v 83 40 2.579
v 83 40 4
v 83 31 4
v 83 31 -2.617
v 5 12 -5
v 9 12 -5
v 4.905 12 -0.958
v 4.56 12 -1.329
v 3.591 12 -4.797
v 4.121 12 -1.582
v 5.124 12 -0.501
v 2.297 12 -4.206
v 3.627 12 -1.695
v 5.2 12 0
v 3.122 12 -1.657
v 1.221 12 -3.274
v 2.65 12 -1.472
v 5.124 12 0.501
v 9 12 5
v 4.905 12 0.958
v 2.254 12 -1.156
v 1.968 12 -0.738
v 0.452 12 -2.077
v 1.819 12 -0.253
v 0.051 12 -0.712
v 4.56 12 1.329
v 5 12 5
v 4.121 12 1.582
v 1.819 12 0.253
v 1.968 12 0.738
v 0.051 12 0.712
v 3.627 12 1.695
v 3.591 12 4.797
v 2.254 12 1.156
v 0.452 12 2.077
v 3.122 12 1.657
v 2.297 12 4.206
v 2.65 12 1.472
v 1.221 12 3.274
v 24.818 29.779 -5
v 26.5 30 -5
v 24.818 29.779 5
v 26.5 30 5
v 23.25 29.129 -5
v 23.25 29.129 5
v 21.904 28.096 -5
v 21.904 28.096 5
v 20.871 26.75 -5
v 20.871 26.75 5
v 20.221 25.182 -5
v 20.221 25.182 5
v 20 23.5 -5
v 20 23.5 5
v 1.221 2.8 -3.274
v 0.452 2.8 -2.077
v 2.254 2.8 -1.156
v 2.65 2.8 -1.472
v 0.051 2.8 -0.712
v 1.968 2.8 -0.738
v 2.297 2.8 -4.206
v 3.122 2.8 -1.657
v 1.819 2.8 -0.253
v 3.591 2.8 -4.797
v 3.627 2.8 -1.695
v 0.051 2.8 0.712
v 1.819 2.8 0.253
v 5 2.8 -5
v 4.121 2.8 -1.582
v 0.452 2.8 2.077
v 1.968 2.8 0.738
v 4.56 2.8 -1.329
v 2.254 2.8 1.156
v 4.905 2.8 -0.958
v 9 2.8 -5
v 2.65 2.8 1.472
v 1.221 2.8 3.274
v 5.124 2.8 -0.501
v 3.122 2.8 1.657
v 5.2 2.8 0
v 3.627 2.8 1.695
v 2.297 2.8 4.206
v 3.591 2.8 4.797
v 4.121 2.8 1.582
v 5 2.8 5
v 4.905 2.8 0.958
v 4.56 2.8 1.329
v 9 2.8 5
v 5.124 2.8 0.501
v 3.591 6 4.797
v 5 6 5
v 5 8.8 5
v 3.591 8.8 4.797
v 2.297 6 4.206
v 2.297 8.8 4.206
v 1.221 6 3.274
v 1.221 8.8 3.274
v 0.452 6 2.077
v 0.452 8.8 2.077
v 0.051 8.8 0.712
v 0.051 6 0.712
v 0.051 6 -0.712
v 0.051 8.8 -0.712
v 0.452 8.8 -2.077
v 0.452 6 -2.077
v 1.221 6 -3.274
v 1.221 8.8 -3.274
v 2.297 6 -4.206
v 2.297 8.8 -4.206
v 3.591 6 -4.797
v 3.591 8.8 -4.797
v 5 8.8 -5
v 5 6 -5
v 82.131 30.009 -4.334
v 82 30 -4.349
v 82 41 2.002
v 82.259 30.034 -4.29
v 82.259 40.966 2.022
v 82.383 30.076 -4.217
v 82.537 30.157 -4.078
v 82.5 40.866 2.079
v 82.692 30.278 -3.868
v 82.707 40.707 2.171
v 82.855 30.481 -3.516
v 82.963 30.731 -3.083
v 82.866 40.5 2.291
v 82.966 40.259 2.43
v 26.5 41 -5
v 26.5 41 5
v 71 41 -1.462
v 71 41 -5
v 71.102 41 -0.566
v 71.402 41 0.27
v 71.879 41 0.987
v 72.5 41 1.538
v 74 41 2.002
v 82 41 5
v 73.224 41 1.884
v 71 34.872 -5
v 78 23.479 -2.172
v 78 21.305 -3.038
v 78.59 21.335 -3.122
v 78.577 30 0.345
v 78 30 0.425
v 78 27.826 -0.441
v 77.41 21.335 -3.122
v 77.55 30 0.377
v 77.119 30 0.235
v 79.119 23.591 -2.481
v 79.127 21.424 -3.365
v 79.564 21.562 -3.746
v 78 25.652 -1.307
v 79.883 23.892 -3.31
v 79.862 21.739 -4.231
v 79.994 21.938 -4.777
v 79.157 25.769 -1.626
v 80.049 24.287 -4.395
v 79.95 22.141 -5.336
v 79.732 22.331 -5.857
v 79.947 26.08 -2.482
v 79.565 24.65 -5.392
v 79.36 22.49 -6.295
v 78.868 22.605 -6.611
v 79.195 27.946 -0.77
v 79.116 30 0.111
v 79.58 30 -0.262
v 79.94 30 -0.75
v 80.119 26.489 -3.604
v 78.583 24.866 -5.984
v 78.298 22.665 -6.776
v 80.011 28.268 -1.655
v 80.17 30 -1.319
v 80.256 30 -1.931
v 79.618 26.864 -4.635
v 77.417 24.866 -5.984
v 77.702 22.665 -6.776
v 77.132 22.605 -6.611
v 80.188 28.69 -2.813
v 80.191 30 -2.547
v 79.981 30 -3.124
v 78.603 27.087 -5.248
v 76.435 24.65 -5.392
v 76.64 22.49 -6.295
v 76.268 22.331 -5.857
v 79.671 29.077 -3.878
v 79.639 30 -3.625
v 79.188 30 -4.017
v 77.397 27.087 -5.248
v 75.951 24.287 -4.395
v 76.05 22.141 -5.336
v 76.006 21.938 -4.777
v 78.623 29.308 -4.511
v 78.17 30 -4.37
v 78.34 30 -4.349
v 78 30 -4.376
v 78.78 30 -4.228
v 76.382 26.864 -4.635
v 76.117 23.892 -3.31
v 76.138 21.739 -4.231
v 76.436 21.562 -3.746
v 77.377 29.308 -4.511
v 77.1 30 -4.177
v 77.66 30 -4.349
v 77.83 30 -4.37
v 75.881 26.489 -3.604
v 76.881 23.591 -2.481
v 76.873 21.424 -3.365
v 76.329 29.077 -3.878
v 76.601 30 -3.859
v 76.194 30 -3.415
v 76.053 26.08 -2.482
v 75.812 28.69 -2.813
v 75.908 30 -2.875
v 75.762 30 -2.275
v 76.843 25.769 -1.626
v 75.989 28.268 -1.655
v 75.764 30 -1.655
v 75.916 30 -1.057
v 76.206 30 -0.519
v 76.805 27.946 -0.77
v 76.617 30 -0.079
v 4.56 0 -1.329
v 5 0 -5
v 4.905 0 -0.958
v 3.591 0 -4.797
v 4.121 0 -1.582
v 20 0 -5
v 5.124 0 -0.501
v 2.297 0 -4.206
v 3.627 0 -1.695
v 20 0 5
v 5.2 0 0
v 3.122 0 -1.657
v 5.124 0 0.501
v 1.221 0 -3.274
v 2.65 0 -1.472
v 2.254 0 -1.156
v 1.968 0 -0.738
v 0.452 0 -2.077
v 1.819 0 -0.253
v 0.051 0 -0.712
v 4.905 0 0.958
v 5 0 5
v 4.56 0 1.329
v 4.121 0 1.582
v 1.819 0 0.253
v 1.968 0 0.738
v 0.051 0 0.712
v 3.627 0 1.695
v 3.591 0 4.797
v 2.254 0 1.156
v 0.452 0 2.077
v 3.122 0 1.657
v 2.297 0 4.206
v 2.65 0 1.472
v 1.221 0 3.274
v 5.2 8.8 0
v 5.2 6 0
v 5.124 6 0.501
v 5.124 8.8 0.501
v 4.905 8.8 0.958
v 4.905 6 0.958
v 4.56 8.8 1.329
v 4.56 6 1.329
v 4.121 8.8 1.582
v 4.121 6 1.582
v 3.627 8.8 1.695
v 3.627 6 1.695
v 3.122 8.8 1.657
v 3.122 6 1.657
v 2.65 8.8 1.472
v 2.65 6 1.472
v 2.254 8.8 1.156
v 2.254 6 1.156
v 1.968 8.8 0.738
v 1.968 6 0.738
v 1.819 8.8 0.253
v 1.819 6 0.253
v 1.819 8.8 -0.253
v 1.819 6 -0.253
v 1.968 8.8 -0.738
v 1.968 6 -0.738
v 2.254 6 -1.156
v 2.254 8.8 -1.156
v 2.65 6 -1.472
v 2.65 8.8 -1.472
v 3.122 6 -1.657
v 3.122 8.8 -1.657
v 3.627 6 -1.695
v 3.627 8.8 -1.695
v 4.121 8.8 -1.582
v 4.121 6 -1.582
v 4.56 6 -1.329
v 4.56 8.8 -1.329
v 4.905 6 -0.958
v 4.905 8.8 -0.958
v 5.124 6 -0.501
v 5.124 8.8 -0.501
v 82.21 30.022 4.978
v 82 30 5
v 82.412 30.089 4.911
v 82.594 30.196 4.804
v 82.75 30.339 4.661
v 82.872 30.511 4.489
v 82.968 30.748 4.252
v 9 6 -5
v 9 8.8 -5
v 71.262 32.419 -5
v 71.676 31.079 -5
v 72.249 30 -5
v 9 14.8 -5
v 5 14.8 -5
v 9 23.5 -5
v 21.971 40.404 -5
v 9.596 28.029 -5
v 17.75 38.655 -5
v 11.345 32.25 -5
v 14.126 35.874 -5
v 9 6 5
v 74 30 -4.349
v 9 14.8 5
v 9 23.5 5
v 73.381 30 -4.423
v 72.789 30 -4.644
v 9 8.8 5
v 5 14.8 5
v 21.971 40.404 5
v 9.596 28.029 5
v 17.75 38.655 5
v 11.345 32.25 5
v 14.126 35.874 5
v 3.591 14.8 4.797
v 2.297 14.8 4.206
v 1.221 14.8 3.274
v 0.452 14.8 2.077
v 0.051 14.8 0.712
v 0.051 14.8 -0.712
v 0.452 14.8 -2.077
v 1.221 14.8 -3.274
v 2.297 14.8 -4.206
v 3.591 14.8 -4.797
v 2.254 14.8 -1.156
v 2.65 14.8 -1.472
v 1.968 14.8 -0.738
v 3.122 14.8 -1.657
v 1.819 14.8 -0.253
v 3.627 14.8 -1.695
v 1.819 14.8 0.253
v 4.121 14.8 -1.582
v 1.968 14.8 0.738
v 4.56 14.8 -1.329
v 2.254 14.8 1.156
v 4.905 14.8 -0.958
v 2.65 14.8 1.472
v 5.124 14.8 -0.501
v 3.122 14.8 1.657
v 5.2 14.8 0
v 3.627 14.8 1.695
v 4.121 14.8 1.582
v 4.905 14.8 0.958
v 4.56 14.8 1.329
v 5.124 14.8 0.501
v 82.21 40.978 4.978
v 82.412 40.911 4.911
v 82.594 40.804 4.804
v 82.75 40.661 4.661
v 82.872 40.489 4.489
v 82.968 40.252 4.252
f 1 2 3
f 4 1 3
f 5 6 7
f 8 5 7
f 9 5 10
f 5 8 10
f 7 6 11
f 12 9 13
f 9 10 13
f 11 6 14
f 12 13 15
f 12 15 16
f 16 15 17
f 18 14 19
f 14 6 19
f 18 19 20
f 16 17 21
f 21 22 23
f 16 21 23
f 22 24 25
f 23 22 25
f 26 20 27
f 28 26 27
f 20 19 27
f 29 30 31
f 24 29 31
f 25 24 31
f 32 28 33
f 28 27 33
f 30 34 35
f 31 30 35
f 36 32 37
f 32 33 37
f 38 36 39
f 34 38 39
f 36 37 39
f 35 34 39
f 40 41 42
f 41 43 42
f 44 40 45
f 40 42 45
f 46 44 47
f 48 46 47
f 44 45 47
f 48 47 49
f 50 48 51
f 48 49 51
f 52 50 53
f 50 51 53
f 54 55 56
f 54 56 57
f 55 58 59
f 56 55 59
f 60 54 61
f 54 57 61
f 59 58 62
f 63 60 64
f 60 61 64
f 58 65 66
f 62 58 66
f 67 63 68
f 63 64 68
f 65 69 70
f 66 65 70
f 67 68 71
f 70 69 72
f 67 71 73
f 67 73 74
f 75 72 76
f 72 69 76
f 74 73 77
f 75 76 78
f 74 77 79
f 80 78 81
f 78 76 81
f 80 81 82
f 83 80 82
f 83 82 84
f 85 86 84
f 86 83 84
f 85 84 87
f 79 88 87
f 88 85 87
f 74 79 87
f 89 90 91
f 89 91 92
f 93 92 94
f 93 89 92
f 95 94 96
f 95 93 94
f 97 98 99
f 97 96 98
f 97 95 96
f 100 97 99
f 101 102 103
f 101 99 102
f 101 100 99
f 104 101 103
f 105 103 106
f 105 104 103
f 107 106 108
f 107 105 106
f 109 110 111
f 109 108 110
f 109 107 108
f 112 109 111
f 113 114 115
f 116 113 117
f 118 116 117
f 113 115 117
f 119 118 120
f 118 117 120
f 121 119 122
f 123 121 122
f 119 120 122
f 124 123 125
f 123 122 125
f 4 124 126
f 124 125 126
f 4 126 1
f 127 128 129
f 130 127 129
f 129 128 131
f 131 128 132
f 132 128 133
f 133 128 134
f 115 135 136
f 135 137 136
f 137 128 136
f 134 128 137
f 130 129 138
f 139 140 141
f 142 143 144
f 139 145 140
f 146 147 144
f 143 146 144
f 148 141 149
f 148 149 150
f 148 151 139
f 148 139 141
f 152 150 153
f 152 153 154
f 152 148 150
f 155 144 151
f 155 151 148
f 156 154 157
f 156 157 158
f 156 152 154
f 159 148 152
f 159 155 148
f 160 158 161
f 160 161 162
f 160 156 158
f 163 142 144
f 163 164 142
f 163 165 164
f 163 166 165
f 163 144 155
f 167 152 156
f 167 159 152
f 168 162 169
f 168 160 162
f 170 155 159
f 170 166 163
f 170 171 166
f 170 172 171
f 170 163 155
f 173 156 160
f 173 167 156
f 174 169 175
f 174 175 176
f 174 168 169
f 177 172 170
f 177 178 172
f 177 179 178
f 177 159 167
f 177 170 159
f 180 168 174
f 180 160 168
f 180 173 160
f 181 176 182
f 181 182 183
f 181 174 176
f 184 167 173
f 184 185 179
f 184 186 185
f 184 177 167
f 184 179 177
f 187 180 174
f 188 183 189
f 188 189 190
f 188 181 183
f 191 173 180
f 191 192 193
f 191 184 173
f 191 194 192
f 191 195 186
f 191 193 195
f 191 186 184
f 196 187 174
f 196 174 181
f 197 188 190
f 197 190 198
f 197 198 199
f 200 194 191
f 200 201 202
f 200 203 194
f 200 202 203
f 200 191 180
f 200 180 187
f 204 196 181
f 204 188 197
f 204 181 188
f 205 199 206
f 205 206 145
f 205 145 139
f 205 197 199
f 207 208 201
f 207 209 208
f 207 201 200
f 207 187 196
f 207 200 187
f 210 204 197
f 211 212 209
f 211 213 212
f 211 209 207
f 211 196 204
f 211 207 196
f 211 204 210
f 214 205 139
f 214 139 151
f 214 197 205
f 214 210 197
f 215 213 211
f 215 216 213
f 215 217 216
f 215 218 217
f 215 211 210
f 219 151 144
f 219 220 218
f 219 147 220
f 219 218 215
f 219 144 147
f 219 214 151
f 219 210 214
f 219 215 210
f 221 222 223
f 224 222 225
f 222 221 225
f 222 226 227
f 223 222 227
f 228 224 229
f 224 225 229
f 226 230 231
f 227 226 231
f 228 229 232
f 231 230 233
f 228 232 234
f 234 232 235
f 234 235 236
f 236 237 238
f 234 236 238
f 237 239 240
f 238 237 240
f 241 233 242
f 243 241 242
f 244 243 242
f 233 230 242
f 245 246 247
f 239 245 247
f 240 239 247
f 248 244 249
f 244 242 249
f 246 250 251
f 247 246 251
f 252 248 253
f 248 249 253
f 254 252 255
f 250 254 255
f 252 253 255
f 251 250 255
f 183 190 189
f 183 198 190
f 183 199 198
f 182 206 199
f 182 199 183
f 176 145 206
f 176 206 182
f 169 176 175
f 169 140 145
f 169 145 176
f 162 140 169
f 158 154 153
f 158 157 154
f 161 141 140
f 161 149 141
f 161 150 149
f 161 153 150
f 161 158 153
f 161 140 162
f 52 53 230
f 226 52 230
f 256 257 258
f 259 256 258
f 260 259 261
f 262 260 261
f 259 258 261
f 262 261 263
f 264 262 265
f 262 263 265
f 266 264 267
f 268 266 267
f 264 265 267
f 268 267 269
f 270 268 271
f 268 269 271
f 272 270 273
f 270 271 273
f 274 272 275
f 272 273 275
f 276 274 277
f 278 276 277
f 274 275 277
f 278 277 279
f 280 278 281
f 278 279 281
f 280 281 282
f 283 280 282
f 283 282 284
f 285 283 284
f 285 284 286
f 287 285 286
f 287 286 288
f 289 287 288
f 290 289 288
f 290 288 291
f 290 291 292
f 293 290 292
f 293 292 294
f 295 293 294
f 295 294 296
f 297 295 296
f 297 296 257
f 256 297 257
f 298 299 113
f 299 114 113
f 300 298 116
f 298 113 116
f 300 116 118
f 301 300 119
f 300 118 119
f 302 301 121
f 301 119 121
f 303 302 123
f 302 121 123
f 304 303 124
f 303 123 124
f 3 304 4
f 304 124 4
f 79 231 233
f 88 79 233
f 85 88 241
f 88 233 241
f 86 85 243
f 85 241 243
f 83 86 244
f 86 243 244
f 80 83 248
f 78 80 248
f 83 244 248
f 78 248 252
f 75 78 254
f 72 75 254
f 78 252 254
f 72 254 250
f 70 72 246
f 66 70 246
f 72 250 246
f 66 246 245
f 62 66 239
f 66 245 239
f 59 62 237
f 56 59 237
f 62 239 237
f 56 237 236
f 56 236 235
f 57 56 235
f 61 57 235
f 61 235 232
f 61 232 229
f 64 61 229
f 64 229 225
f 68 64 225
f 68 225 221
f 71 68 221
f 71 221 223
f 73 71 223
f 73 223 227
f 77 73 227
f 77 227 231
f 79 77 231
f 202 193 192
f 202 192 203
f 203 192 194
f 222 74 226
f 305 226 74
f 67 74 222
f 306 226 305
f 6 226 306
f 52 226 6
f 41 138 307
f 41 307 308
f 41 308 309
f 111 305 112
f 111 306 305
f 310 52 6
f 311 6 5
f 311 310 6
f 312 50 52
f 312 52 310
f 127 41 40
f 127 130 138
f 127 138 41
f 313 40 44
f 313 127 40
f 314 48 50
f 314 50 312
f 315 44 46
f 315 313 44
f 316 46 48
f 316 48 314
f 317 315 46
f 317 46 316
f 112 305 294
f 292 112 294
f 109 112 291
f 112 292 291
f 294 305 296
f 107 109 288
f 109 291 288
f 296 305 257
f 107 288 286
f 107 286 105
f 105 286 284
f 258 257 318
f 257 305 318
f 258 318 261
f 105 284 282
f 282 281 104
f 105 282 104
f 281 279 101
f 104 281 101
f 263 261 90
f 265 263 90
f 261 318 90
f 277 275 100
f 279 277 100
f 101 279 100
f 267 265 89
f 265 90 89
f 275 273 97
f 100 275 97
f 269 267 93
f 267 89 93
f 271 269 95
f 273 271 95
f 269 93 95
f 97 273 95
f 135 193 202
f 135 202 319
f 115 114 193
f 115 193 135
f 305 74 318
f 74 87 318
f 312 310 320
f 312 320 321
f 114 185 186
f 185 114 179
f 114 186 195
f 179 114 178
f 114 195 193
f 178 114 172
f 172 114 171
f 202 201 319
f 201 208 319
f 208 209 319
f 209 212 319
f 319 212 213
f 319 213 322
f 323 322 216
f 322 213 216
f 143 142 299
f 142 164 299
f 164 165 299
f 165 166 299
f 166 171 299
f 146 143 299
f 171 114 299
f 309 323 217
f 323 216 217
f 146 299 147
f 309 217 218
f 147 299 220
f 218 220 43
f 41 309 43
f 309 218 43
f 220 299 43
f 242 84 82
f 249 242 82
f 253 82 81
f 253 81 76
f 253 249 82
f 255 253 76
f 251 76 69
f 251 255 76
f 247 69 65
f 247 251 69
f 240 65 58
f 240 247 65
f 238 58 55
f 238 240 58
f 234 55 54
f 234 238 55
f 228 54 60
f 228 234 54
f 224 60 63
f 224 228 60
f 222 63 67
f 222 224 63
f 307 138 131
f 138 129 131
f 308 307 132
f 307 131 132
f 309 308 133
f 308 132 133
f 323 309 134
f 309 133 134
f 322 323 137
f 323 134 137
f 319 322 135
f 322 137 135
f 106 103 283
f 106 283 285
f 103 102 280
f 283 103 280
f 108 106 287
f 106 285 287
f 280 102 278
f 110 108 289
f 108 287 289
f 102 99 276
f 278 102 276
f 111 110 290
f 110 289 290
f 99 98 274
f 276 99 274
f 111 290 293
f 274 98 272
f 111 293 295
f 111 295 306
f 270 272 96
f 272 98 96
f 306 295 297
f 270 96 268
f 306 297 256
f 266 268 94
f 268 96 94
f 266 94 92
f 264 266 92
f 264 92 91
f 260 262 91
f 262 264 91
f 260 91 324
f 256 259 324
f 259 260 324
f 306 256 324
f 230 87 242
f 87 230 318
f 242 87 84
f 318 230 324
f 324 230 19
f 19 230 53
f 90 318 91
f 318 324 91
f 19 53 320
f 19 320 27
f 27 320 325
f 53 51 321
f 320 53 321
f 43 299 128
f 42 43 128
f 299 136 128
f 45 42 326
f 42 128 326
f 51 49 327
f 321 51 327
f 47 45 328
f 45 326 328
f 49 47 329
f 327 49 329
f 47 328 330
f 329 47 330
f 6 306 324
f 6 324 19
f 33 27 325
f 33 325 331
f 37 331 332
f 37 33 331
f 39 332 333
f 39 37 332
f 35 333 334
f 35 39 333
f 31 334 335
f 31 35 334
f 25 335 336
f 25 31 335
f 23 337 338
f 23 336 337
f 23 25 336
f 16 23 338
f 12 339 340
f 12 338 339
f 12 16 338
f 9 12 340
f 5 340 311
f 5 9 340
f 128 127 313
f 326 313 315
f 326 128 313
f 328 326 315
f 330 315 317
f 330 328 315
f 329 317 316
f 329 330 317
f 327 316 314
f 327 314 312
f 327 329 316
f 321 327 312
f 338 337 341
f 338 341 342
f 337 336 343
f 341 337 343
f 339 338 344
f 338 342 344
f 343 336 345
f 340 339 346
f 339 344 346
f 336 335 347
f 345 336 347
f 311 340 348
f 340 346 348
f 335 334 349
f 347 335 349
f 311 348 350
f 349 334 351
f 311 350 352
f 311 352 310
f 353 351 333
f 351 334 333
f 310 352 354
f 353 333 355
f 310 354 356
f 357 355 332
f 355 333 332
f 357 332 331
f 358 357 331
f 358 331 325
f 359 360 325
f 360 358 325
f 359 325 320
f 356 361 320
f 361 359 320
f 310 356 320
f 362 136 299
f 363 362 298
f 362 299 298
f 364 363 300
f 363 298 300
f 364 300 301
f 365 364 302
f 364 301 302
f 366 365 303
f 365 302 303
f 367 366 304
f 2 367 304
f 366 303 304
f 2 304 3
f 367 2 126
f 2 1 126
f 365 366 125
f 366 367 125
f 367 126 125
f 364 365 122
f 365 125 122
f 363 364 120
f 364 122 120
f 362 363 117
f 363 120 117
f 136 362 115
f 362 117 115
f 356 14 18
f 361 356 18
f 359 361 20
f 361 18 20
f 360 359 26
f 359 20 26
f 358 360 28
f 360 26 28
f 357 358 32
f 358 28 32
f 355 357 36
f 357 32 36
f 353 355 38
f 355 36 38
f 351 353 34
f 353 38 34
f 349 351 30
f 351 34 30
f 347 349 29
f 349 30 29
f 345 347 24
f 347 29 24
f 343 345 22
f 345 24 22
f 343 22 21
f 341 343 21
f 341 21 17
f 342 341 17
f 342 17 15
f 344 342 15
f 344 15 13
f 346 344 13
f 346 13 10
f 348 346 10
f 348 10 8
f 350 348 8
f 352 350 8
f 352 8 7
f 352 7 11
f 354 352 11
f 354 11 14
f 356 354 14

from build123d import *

# Parameters (mm, degrees)
PAD002_DEPTH    = 5
POCKET001_DEPTH = 41.001
SKETCH006_R     = 1.7
POCKET002_DEPTH = 41.001
POCKET003_DEPTH = 12
FILLET001_R     = 3
FILLET002_R     = 1


with BuildPart() as part:
    # Sketch004 → Pad002 (new body, symmetric)
    with BuildSketch(Plane.XY):
        with BuildLine():
            Line((0, 0), (0, 2.8))
            Line((0, 2.8), (9, 2.8))
            Line((9, 2.8), (9, 6))
            Line((9, 6), (0, 6))
            Line((0, 6), (0, 8.8))
            Line((0, 8.8), (9, 8.8))
            Line((9, 8.8), (9, 12))
            Line((9, 12), (0, 12))
            Line((0, 12), (0, 14.8))
            Line((0, 14.8), (9, 14.8))
            Line((9, 14.8), (9, 23.5))
            ThreePointArc((26.5, 41), (14.1256313292, 35.8743686708), (9, 23.5))
            Line((26.5, 41), (83, 41))
            Line((83, 41), (83, 30))
            Line((83, 30), (26.5, 30))
            ThreePointArc((26.5, 30), (21.9038059223, 28.0961940777), (20, 23.5))
            Line((20, 23.5), (20, 0))
            Line((20, 0), (0, 0))
        make_face()
    extrude(amount=PAD002_DEPTH, both=True)

    # Sketch005 (on Face18 of Pad002) → Pocket001 (cut, through all)
    with BuildSketch(Plane.XZ):
        with BuildLine():
            ThreePointArc((5, 5), (0, 0), (5, -5))
            Line((5, -6), (5, -5))
            Line((-1, -6), (5, -6))
            Line((-1, 6), (-1, -6))
            Line((5, 6), (-1, 6))
            Line((5, 6), (5, 5))
        make_face()
    extrude(amount=-POCKET001_DEPTH, mode=Mode.SUBTRACT)

    # Sketch006 (on Face2 of Pocket001) → Pocket002 (cut, through all)
    with BuildSketch(Plane.XZ):
        with Locations((3.5, 0)):
            Circle(SKETCH006_R)
    extrude(amount=-POCKET002_DEPTH, mode=Mode.SUBTRACT)

    # Sketch007 (on Face20 of Pocket002) → Revolution (revolve)
    with BuildSketch(Plane.YZ.offset(78)):
        Polygon((21.3046738147, -3.0383206522), (34.6684285365, 2.2847238185), (35.5, 0), (21.9887141013, -4.9177058938), align=None)
    revolve(axis=Axis((78, 4.1527111346, -11.4094800719), (0, 0.9396926208, 0.3420201433)))

    # Sketch008 (on Face20 of Revolution) → Pocket003 (cut)
    with BuildSketch(Plane.YZ.offset(83)):
        Polygon((30, -4.3490166725), (41, 2.0018362885), (41, -5), (30, -5), align=None)
    extrude(amount=-POCKET003_DEPTH, mode=Mode.SUBTRACT)

    # Fillet001
    fillet001_edges = [part.edges().sort_by_distance(p)[0] for p in [
        (71, 35.5, -1.17359),
    ]]
    fillet(fillet001_edges, radius=FILLET001_R)

    # Fillet002
    fillet002_edges = [part.edges().sort_by_distance(p)[0] for p in [
        (83, 30, 0.325492),
        (83, 35.5, 5),
        (83, 41, 3.500918),
        (83, 35.5, -1.17359),
    ]]
    fillet(fillet002_edges, radius=FILLET002_R)


solid = part.part
